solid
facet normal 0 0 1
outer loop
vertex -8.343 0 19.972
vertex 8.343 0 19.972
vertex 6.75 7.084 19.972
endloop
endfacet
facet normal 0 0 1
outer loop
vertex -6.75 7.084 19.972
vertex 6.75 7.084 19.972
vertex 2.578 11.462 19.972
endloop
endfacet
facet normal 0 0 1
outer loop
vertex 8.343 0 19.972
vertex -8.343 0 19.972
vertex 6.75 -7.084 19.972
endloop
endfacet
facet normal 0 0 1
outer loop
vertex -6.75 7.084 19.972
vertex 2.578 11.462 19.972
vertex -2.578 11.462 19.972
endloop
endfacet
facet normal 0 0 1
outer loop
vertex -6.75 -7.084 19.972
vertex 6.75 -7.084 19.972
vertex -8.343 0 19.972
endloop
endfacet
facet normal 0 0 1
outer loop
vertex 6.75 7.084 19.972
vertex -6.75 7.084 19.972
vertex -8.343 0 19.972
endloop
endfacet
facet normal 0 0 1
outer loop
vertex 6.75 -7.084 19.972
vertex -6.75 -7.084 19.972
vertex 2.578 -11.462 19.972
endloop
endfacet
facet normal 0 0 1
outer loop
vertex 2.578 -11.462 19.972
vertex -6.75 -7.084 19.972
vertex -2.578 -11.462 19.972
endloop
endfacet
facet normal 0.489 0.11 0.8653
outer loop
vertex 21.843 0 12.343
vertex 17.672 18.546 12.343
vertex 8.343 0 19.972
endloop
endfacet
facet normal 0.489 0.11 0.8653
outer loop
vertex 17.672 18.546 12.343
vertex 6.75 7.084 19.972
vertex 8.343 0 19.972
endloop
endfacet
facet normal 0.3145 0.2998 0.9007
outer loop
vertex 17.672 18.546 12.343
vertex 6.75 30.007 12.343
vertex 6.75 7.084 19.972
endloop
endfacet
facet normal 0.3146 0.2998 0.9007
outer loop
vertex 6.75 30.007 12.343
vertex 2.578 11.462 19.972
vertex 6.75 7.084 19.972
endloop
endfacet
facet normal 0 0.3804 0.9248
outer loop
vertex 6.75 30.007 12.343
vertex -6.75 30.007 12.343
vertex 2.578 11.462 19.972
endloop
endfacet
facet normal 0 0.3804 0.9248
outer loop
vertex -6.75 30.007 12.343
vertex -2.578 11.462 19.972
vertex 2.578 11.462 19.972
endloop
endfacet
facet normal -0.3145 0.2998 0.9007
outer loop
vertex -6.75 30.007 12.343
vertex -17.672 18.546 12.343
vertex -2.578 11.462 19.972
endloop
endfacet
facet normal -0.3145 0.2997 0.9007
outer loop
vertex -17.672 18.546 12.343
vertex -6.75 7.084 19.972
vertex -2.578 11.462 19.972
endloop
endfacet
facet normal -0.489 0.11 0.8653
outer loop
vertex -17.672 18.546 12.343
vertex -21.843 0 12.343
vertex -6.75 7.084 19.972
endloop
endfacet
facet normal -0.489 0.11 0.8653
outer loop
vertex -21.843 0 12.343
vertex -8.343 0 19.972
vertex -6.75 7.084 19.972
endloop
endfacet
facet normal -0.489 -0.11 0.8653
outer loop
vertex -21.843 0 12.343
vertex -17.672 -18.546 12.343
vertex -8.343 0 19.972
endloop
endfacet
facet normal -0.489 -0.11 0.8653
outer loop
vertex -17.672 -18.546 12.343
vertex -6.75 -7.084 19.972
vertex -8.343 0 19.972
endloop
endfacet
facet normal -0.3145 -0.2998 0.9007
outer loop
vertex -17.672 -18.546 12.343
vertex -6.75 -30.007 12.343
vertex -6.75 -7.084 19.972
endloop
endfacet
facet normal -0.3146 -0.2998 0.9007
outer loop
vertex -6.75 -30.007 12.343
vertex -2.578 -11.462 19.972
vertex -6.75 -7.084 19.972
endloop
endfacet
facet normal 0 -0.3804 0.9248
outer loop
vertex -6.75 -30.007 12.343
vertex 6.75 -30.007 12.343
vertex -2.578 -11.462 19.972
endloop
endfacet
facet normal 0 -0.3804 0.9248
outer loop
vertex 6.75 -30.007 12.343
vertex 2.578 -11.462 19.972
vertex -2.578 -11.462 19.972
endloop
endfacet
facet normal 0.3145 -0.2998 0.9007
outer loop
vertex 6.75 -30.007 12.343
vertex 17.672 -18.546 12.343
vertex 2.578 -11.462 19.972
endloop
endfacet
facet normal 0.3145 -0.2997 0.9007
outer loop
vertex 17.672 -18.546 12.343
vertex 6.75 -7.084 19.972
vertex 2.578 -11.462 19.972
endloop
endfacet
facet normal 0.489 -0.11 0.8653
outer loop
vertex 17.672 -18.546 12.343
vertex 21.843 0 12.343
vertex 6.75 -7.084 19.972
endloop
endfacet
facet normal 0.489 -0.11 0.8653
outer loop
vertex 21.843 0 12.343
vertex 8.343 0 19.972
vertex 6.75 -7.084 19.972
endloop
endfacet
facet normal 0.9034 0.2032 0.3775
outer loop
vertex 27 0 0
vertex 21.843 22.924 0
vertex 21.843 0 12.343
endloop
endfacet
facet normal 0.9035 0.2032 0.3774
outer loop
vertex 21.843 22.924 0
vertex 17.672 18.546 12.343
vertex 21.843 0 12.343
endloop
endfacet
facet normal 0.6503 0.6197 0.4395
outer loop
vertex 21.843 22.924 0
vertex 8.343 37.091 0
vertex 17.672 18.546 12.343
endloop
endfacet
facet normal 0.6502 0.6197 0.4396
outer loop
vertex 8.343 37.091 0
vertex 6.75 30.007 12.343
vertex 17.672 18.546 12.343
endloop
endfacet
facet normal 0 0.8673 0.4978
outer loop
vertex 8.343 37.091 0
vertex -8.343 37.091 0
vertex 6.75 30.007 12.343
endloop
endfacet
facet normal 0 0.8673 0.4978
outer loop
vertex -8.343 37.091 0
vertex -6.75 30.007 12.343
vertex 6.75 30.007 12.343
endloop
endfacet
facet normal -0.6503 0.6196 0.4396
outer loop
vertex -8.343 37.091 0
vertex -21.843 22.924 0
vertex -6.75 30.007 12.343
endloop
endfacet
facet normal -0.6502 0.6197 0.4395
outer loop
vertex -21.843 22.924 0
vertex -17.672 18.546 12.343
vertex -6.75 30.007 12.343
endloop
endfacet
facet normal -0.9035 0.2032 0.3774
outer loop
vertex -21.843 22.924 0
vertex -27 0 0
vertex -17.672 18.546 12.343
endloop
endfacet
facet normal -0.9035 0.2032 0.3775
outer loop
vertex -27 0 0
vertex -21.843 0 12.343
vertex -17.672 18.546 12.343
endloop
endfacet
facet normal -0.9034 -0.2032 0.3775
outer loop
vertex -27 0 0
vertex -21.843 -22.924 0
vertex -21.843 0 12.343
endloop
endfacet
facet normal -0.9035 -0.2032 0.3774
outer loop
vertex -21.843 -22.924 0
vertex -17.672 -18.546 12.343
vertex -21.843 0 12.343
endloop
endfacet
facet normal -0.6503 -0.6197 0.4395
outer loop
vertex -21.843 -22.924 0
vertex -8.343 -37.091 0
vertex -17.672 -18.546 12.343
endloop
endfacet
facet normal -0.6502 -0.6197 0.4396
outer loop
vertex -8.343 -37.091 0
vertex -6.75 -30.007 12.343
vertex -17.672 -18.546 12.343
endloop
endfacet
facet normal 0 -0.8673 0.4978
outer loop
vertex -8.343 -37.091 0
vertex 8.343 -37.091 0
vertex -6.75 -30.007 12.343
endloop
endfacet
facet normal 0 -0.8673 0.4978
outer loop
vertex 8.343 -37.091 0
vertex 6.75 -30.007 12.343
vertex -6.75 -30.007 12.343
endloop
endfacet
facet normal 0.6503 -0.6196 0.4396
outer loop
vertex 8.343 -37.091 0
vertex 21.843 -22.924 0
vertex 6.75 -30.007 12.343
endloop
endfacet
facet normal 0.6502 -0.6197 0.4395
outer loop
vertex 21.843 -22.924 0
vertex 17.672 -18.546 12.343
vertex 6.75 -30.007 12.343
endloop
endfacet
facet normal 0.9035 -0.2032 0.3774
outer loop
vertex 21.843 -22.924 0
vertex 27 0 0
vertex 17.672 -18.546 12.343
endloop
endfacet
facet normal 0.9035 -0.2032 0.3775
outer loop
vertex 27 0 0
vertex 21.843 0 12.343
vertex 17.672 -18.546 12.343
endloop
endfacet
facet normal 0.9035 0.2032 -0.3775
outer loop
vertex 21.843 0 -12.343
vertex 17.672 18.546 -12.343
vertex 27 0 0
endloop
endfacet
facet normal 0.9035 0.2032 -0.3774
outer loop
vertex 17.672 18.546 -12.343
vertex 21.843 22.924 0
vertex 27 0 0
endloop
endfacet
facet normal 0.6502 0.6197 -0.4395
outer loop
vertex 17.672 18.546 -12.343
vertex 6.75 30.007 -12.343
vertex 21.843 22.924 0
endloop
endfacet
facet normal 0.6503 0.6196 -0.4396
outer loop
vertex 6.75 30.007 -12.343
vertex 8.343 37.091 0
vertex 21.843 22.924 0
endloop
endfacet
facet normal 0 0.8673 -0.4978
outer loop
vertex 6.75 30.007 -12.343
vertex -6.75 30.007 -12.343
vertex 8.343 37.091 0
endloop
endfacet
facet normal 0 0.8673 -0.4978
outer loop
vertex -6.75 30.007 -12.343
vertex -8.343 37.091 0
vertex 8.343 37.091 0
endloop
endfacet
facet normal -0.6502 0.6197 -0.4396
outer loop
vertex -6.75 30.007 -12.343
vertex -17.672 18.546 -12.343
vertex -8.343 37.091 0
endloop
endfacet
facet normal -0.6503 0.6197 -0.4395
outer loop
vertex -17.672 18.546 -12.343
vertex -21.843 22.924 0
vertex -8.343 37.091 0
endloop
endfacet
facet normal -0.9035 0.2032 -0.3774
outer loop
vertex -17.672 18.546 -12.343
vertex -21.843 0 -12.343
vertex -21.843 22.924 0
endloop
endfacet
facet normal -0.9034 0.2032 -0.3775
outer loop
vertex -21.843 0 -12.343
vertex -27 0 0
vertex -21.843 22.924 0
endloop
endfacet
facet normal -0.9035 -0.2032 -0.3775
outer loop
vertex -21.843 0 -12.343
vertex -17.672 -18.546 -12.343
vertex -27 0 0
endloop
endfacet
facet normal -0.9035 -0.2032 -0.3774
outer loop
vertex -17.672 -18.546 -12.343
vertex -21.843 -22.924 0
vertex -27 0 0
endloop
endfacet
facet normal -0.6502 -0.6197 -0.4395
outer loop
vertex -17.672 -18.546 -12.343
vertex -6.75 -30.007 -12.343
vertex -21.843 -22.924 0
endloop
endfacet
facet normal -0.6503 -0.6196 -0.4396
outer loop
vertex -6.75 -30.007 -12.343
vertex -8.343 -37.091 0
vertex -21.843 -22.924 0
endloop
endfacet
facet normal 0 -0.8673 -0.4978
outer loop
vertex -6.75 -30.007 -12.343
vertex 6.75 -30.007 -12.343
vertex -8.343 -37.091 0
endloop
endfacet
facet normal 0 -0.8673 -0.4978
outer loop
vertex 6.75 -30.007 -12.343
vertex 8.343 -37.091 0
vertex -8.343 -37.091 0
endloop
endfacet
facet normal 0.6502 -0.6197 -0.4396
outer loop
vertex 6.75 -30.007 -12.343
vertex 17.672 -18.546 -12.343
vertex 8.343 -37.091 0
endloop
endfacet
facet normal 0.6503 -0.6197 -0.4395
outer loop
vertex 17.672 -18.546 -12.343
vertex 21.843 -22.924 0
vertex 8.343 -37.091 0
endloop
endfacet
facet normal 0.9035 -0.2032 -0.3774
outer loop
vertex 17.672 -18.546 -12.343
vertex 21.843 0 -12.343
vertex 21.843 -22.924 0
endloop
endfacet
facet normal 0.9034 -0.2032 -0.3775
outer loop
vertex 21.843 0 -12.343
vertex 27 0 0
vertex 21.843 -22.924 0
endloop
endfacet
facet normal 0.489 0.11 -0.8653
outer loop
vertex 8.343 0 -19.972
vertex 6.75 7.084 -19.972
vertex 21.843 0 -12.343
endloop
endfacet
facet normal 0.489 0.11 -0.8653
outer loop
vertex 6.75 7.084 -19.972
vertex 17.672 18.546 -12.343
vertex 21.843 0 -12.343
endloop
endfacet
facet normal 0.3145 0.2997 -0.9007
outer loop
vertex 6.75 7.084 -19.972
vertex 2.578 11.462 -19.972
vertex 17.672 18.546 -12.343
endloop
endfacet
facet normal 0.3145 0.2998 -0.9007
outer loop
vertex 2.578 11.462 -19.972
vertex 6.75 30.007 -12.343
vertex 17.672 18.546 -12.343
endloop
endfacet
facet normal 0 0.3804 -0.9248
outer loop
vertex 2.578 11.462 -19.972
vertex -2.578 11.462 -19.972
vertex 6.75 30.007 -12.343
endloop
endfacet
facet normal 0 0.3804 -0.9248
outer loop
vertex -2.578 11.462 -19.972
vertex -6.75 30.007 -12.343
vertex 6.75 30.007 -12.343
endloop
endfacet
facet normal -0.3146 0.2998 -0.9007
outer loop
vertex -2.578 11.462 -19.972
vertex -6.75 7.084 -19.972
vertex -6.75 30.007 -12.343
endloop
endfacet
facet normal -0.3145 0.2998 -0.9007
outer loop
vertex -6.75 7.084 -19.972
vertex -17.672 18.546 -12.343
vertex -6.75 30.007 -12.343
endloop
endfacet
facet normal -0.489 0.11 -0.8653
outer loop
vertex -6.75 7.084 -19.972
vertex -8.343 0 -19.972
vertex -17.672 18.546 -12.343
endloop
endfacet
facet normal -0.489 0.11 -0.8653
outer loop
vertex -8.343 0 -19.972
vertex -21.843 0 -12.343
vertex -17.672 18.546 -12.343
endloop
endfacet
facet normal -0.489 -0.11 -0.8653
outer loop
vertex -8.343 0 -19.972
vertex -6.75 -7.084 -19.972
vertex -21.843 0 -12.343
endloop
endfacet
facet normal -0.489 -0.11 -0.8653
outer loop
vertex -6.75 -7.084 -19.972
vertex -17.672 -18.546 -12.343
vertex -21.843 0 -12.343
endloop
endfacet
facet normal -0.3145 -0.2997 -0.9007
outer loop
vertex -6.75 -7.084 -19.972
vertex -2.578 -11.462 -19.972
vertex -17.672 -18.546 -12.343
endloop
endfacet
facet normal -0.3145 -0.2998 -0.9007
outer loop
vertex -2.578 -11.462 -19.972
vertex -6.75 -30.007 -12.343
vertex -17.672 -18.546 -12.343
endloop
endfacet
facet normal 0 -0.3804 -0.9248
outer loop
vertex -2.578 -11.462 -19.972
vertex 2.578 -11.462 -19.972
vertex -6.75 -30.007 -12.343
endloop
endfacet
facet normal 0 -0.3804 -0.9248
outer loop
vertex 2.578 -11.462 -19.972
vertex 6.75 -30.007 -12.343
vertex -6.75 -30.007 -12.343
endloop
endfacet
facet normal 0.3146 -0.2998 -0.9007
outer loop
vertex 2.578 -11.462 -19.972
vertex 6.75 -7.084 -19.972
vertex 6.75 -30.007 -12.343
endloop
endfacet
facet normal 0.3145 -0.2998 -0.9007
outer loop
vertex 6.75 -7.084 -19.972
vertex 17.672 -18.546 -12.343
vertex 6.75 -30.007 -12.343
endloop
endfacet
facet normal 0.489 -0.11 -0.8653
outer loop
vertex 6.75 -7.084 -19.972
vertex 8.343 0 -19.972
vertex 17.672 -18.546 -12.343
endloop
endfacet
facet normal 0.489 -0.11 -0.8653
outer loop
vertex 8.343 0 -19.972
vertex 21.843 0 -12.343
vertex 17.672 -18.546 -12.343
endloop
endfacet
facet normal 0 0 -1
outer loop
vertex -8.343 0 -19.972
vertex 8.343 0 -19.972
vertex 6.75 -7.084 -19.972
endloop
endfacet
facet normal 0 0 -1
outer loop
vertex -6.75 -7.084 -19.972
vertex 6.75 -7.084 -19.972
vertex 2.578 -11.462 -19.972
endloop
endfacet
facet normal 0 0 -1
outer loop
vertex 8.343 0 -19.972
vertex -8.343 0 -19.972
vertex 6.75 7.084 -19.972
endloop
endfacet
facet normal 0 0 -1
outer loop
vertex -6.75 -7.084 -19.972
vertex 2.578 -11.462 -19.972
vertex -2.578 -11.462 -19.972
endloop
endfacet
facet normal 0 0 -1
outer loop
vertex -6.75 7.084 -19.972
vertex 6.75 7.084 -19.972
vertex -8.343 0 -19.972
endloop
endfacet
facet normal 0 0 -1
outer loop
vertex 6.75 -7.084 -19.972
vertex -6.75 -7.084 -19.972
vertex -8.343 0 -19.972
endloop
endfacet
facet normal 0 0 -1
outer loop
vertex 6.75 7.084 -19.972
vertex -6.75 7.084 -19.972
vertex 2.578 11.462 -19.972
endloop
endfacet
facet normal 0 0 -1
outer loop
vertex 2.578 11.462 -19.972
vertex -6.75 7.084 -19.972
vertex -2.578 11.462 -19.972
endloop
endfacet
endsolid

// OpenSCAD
// Generated by SolidPython 1.0.1 on 2020-07-29 00:46:48


scale(v = [9, 13, 7]) {
	sphere(r = 3);
}
/***********************************************
*********      SolidPython code:      **********
************************************************
 
# import packages: SolidPython
from solid import *
from solid.utils import *
from itertools import chain, combinations, permutations


class Resize:

    def __init__(self, scad_file):
        self.scad_file = scad_file
        #self.scad_file = import_scad(scad_file)
        # cone/cylinder param:
        self.r1 = 0
        self.r2 = 0
        self.h = 0
        # rectangular prism param:
        self.w = 0
        self.l = 0
        # ellipse param:
        self.r = 0

    # import OpenScad code (file name corresponds to shape)


    # classify shape + parameters
    def assign(self, param1, param2, param3):
        if self.scad_file == 'cone.scad':
            self.r1 = param1
            self.r2 = param2
            self.h = param3
        elif self.scad_file == 'cylinder.scad':
            self.r1 = param1
            self.r2 = param2
            self.h = param3
        elif self.scad_file == 'rectangularPrism.scad':
            self.h = param1
            self.l = param2
            self.w = param3
        else:
            self.r = param1
            self.h = param2

    # resize parameters
    def iterate(self):
        x = range(3, 20, 2)
        i = 1
        if self.scad_file == 'cone.scad':
            tempList = list(permutations(x, 2))
            for temp in tempList:
                param1 = temp[0]
                param2 = temp[1]
                filepath = 'produced_scad_files/' + 'cone' + str(param1) + '_' + str(param2) + '_' + '.scad'
                scad_render_to_file(cylinder(h=param1, r1=param2, r2=0), filepath)

        elif self.scad_file == 'cylinder.scad':
            tempList = list(permutations(x, 3))
            for temp in tempList:
                param1 = temp[0]
                param2 = temp[1]
                filepath = 'produced_scad_files/' + 'cylinder' + str(param1) + '_' + str(param2) + '_' + '.scad'
                scad_render_to_file(cylinder(h=param1, r1=param2, r2=param2), filepath)

        elif self.scad_file == 'rectangularPrism.scad':
            tempList = list(permutations(x, 3))
            for temp in tempList:
                param1 = temp[0]
                param2 = temp[1]
                param3 = temp[2]
                filepath = 'produced_scad_files/' + 'rectangularPrism' + str(param1) + '_' + str(param2) + '_' + str(
                    param3) + '.scad'
                scad_render_to_file(cube(size=(param1, param2, param3)), filepath)

        elif self.scad_file == 'ellipse.scad':
            tempList = list(permutations(x, 4))
            for temp in tempList:
                param1 = temp[0]
                param2 = temp[1]
                param3 = temp[2]
                param4 = temp[3]
                filepath = 'produced_scad_files/' + 'ellipse' + str(param1) + '_' + str(param2) + '_' + str(param3) + '_' + str(param4) + '.scad'
                scad_render_to_file(scale([param1, param2, param3])(sphere(r=param4)), filepath)

    def render_to_scadfile(self):
        scad_render_to_file(scad, 'example.scad') 
 
************************************************/
